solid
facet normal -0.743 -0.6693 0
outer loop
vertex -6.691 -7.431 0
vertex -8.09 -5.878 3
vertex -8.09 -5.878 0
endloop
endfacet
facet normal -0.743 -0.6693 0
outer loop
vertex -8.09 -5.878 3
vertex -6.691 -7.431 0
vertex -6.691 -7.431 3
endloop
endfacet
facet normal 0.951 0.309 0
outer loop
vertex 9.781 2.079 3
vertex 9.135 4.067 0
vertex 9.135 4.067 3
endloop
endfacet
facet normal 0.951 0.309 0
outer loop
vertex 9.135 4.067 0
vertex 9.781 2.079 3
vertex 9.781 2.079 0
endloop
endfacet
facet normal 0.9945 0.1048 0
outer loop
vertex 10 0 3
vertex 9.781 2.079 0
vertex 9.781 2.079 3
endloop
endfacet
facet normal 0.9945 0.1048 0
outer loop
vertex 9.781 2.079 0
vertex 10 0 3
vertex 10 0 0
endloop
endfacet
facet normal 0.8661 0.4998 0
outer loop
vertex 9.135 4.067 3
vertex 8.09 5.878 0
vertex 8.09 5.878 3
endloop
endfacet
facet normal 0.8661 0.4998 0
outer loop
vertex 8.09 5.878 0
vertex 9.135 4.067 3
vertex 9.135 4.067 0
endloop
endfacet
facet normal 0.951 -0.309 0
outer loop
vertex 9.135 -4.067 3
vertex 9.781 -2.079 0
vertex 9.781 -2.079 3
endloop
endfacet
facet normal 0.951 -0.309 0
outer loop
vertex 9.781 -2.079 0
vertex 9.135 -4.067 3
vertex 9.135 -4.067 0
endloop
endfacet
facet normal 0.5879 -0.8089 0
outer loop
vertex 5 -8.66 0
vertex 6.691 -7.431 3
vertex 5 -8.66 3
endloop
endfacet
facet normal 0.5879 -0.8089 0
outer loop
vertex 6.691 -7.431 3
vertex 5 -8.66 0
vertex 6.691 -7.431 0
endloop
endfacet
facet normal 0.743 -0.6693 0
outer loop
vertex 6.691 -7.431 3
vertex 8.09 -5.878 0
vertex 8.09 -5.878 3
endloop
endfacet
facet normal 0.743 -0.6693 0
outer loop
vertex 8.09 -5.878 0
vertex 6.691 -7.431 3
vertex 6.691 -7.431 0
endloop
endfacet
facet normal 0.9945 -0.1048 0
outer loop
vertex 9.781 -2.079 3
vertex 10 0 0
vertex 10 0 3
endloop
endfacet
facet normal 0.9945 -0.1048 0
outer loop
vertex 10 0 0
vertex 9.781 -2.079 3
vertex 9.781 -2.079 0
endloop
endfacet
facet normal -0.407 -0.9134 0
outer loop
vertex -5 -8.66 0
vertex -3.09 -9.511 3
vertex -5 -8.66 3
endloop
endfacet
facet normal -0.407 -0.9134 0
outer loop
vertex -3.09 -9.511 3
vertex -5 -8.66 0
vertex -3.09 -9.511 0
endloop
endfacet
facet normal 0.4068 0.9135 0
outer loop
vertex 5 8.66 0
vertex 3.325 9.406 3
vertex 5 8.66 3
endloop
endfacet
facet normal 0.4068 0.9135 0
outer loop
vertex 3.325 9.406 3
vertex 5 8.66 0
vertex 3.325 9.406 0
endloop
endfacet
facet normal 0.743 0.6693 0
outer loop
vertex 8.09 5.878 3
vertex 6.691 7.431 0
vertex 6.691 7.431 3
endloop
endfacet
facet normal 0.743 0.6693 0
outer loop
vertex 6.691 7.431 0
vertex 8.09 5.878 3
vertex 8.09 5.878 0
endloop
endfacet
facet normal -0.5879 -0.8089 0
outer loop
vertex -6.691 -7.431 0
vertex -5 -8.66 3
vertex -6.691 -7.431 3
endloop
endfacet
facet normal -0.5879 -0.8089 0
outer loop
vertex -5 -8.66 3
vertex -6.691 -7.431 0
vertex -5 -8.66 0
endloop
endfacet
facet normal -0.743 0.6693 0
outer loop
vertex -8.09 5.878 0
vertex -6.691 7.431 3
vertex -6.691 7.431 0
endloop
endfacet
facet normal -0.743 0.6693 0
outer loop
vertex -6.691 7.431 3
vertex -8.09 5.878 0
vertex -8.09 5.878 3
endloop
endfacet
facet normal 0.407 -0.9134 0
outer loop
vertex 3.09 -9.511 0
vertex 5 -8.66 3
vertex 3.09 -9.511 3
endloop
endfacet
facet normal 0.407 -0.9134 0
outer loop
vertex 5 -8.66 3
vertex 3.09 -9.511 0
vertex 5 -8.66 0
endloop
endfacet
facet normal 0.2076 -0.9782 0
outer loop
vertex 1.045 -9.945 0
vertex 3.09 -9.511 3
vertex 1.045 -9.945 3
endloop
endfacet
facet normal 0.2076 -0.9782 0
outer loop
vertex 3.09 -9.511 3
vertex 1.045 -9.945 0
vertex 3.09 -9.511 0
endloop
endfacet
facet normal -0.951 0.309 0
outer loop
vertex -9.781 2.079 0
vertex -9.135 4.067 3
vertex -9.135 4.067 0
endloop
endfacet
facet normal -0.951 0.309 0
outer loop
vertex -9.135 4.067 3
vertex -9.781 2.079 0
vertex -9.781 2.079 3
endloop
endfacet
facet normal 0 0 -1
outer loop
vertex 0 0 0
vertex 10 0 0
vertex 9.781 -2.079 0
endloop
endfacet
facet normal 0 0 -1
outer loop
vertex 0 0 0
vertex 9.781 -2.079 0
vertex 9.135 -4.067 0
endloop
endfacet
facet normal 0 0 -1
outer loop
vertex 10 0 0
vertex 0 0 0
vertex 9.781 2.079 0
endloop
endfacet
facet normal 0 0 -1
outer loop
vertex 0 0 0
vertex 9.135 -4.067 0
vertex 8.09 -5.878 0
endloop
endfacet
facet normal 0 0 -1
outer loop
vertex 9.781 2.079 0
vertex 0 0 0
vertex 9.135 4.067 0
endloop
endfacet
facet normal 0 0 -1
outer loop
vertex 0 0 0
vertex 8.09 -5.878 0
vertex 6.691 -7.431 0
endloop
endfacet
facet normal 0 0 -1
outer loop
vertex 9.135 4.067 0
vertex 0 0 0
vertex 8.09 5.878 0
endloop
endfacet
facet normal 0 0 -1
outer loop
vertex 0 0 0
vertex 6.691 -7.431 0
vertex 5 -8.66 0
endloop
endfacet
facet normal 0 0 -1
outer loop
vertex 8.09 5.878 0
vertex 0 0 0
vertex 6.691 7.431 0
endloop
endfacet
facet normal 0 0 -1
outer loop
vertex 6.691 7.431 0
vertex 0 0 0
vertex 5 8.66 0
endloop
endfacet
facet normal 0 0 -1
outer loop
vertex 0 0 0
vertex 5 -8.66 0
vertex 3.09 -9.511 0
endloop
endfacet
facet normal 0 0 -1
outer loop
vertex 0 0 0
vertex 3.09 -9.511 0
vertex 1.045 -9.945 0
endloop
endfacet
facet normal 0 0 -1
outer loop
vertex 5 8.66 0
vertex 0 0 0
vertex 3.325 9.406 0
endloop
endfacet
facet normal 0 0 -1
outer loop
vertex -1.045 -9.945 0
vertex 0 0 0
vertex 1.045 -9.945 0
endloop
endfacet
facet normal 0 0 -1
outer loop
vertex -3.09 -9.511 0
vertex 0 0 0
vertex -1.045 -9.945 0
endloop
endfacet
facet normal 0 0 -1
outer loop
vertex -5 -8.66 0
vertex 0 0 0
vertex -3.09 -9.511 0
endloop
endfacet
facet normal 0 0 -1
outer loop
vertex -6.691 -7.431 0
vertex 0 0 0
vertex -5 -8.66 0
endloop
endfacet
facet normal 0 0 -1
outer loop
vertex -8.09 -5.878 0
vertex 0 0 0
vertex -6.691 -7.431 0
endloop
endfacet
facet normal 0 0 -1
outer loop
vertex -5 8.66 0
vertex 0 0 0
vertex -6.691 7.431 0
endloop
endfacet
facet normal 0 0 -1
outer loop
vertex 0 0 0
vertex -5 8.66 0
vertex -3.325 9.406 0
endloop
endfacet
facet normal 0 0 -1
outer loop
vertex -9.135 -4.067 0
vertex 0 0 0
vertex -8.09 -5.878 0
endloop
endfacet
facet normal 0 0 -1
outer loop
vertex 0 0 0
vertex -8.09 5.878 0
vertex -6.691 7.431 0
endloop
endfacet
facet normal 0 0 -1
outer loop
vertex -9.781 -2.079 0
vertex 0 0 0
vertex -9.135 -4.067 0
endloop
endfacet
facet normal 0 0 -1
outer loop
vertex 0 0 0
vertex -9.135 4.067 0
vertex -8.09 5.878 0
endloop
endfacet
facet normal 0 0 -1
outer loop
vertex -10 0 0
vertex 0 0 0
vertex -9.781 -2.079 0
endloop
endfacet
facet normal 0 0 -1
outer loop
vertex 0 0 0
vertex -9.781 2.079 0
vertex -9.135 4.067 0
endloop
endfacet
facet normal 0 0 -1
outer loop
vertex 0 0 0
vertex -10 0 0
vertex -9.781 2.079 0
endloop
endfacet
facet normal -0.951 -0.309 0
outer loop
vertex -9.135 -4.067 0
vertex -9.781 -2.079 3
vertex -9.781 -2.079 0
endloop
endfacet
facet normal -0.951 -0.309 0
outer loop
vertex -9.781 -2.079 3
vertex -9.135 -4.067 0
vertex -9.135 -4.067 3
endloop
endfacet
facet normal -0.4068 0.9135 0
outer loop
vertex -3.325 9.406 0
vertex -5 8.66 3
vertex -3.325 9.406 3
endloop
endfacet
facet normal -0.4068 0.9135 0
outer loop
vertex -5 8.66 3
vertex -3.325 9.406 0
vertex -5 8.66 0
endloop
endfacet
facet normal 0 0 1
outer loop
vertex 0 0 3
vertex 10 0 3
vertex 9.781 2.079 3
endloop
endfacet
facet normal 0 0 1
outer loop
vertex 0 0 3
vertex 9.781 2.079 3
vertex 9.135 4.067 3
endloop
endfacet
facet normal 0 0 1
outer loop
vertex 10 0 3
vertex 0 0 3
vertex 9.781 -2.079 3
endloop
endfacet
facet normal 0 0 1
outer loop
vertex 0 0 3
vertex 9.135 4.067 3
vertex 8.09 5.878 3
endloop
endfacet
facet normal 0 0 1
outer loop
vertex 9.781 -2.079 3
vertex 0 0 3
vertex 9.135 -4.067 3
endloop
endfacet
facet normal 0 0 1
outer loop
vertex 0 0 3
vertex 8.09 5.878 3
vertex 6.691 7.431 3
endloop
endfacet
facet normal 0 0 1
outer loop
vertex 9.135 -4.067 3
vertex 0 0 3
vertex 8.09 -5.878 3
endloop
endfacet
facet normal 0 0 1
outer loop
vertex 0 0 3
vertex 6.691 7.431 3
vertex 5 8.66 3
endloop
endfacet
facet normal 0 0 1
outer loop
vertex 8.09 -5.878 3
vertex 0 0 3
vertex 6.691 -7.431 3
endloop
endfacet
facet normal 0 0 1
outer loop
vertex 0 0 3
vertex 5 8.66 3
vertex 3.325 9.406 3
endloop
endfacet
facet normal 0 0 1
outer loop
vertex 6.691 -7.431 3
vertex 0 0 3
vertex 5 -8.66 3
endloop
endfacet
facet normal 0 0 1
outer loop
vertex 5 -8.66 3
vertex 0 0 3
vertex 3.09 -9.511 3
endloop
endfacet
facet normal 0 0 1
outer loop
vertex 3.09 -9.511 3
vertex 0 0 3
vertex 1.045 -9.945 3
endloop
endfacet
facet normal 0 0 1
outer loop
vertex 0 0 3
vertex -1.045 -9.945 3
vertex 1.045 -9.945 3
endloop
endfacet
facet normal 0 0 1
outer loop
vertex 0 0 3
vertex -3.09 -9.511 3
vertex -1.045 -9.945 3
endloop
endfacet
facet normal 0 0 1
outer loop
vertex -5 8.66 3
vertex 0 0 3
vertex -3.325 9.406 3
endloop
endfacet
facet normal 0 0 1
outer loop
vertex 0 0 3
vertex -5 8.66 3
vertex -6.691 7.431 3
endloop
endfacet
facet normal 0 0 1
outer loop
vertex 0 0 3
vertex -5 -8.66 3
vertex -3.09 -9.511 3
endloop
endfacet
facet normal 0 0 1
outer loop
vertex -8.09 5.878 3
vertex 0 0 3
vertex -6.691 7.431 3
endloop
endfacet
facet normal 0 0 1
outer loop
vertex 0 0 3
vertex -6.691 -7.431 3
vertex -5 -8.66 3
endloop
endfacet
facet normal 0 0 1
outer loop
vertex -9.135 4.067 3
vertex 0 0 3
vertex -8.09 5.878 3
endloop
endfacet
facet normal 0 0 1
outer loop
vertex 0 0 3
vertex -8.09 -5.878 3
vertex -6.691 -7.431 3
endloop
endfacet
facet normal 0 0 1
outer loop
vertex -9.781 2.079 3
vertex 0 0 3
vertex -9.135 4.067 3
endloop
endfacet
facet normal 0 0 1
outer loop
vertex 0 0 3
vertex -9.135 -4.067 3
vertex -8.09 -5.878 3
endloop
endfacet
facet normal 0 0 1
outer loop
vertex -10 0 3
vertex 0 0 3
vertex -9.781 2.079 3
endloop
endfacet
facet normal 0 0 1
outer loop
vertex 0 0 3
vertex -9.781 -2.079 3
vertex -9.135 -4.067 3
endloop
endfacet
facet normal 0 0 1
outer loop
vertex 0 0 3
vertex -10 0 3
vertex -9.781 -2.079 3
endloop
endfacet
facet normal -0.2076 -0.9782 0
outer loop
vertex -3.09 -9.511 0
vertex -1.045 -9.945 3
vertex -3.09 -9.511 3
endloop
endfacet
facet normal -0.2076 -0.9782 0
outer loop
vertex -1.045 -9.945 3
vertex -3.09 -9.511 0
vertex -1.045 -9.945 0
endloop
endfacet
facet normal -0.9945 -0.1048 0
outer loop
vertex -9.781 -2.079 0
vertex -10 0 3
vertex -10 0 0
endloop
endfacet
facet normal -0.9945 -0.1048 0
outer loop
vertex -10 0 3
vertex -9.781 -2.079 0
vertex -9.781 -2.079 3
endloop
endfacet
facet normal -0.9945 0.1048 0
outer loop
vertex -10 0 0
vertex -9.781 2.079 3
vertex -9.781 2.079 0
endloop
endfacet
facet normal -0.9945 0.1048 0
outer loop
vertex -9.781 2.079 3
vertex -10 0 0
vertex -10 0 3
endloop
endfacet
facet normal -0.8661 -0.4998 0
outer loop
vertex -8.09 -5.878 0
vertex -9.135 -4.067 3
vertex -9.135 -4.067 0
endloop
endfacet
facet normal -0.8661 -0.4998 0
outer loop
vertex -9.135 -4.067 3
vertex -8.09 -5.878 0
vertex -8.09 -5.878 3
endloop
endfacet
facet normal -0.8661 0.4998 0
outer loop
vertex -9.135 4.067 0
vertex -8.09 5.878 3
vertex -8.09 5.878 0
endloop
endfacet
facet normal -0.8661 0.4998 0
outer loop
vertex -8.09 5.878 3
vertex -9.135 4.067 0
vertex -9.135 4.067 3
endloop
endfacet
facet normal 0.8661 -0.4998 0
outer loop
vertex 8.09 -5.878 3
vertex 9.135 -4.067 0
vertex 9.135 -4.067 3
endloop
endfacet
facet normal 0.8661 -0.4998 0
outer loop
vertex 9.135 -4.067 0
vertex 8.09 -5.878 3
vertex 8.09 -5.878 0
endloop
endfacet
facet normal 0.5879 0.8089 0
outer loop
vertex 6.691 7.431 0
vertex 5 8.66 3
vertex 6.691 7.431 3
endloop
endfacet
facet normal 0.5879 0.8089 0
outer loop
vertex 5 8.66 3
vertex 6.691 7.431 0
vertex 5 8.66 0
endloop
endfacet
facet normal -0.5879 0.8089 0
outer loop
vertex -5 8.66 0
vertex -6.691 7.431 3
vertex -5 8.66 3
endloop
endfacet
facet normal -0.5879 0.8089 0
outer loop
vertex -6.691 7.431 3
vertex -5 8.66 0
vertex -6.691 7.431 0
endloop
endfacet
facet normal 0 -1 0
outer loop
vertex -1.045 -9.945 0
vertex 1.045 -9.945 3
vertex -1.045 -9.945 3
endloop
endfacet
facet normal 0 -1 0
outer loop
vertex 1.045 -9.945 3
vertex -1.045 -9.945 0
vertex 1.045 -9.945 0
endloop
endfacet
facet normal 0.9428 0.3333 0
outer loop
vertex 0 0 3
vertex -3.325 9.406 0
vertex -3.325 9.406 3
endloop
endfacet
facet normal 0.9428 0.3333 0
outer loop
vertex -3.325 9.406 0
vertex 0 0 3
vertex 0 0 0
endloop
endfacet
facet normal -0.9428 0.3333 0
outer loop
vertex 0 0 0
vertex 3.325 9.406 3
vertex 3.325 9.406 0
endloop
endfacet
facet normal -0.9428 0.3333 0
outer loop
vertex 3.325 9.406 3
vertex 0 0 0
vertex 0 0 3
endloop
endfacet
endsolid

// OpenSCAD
difference() {
	cylinder(r=10, h=3);
	scale([0.5, sqrt(2), 1]) {
		rotate([0, 0, 45]) {
			cube([10, 10, 3]);
		}
	}
}
